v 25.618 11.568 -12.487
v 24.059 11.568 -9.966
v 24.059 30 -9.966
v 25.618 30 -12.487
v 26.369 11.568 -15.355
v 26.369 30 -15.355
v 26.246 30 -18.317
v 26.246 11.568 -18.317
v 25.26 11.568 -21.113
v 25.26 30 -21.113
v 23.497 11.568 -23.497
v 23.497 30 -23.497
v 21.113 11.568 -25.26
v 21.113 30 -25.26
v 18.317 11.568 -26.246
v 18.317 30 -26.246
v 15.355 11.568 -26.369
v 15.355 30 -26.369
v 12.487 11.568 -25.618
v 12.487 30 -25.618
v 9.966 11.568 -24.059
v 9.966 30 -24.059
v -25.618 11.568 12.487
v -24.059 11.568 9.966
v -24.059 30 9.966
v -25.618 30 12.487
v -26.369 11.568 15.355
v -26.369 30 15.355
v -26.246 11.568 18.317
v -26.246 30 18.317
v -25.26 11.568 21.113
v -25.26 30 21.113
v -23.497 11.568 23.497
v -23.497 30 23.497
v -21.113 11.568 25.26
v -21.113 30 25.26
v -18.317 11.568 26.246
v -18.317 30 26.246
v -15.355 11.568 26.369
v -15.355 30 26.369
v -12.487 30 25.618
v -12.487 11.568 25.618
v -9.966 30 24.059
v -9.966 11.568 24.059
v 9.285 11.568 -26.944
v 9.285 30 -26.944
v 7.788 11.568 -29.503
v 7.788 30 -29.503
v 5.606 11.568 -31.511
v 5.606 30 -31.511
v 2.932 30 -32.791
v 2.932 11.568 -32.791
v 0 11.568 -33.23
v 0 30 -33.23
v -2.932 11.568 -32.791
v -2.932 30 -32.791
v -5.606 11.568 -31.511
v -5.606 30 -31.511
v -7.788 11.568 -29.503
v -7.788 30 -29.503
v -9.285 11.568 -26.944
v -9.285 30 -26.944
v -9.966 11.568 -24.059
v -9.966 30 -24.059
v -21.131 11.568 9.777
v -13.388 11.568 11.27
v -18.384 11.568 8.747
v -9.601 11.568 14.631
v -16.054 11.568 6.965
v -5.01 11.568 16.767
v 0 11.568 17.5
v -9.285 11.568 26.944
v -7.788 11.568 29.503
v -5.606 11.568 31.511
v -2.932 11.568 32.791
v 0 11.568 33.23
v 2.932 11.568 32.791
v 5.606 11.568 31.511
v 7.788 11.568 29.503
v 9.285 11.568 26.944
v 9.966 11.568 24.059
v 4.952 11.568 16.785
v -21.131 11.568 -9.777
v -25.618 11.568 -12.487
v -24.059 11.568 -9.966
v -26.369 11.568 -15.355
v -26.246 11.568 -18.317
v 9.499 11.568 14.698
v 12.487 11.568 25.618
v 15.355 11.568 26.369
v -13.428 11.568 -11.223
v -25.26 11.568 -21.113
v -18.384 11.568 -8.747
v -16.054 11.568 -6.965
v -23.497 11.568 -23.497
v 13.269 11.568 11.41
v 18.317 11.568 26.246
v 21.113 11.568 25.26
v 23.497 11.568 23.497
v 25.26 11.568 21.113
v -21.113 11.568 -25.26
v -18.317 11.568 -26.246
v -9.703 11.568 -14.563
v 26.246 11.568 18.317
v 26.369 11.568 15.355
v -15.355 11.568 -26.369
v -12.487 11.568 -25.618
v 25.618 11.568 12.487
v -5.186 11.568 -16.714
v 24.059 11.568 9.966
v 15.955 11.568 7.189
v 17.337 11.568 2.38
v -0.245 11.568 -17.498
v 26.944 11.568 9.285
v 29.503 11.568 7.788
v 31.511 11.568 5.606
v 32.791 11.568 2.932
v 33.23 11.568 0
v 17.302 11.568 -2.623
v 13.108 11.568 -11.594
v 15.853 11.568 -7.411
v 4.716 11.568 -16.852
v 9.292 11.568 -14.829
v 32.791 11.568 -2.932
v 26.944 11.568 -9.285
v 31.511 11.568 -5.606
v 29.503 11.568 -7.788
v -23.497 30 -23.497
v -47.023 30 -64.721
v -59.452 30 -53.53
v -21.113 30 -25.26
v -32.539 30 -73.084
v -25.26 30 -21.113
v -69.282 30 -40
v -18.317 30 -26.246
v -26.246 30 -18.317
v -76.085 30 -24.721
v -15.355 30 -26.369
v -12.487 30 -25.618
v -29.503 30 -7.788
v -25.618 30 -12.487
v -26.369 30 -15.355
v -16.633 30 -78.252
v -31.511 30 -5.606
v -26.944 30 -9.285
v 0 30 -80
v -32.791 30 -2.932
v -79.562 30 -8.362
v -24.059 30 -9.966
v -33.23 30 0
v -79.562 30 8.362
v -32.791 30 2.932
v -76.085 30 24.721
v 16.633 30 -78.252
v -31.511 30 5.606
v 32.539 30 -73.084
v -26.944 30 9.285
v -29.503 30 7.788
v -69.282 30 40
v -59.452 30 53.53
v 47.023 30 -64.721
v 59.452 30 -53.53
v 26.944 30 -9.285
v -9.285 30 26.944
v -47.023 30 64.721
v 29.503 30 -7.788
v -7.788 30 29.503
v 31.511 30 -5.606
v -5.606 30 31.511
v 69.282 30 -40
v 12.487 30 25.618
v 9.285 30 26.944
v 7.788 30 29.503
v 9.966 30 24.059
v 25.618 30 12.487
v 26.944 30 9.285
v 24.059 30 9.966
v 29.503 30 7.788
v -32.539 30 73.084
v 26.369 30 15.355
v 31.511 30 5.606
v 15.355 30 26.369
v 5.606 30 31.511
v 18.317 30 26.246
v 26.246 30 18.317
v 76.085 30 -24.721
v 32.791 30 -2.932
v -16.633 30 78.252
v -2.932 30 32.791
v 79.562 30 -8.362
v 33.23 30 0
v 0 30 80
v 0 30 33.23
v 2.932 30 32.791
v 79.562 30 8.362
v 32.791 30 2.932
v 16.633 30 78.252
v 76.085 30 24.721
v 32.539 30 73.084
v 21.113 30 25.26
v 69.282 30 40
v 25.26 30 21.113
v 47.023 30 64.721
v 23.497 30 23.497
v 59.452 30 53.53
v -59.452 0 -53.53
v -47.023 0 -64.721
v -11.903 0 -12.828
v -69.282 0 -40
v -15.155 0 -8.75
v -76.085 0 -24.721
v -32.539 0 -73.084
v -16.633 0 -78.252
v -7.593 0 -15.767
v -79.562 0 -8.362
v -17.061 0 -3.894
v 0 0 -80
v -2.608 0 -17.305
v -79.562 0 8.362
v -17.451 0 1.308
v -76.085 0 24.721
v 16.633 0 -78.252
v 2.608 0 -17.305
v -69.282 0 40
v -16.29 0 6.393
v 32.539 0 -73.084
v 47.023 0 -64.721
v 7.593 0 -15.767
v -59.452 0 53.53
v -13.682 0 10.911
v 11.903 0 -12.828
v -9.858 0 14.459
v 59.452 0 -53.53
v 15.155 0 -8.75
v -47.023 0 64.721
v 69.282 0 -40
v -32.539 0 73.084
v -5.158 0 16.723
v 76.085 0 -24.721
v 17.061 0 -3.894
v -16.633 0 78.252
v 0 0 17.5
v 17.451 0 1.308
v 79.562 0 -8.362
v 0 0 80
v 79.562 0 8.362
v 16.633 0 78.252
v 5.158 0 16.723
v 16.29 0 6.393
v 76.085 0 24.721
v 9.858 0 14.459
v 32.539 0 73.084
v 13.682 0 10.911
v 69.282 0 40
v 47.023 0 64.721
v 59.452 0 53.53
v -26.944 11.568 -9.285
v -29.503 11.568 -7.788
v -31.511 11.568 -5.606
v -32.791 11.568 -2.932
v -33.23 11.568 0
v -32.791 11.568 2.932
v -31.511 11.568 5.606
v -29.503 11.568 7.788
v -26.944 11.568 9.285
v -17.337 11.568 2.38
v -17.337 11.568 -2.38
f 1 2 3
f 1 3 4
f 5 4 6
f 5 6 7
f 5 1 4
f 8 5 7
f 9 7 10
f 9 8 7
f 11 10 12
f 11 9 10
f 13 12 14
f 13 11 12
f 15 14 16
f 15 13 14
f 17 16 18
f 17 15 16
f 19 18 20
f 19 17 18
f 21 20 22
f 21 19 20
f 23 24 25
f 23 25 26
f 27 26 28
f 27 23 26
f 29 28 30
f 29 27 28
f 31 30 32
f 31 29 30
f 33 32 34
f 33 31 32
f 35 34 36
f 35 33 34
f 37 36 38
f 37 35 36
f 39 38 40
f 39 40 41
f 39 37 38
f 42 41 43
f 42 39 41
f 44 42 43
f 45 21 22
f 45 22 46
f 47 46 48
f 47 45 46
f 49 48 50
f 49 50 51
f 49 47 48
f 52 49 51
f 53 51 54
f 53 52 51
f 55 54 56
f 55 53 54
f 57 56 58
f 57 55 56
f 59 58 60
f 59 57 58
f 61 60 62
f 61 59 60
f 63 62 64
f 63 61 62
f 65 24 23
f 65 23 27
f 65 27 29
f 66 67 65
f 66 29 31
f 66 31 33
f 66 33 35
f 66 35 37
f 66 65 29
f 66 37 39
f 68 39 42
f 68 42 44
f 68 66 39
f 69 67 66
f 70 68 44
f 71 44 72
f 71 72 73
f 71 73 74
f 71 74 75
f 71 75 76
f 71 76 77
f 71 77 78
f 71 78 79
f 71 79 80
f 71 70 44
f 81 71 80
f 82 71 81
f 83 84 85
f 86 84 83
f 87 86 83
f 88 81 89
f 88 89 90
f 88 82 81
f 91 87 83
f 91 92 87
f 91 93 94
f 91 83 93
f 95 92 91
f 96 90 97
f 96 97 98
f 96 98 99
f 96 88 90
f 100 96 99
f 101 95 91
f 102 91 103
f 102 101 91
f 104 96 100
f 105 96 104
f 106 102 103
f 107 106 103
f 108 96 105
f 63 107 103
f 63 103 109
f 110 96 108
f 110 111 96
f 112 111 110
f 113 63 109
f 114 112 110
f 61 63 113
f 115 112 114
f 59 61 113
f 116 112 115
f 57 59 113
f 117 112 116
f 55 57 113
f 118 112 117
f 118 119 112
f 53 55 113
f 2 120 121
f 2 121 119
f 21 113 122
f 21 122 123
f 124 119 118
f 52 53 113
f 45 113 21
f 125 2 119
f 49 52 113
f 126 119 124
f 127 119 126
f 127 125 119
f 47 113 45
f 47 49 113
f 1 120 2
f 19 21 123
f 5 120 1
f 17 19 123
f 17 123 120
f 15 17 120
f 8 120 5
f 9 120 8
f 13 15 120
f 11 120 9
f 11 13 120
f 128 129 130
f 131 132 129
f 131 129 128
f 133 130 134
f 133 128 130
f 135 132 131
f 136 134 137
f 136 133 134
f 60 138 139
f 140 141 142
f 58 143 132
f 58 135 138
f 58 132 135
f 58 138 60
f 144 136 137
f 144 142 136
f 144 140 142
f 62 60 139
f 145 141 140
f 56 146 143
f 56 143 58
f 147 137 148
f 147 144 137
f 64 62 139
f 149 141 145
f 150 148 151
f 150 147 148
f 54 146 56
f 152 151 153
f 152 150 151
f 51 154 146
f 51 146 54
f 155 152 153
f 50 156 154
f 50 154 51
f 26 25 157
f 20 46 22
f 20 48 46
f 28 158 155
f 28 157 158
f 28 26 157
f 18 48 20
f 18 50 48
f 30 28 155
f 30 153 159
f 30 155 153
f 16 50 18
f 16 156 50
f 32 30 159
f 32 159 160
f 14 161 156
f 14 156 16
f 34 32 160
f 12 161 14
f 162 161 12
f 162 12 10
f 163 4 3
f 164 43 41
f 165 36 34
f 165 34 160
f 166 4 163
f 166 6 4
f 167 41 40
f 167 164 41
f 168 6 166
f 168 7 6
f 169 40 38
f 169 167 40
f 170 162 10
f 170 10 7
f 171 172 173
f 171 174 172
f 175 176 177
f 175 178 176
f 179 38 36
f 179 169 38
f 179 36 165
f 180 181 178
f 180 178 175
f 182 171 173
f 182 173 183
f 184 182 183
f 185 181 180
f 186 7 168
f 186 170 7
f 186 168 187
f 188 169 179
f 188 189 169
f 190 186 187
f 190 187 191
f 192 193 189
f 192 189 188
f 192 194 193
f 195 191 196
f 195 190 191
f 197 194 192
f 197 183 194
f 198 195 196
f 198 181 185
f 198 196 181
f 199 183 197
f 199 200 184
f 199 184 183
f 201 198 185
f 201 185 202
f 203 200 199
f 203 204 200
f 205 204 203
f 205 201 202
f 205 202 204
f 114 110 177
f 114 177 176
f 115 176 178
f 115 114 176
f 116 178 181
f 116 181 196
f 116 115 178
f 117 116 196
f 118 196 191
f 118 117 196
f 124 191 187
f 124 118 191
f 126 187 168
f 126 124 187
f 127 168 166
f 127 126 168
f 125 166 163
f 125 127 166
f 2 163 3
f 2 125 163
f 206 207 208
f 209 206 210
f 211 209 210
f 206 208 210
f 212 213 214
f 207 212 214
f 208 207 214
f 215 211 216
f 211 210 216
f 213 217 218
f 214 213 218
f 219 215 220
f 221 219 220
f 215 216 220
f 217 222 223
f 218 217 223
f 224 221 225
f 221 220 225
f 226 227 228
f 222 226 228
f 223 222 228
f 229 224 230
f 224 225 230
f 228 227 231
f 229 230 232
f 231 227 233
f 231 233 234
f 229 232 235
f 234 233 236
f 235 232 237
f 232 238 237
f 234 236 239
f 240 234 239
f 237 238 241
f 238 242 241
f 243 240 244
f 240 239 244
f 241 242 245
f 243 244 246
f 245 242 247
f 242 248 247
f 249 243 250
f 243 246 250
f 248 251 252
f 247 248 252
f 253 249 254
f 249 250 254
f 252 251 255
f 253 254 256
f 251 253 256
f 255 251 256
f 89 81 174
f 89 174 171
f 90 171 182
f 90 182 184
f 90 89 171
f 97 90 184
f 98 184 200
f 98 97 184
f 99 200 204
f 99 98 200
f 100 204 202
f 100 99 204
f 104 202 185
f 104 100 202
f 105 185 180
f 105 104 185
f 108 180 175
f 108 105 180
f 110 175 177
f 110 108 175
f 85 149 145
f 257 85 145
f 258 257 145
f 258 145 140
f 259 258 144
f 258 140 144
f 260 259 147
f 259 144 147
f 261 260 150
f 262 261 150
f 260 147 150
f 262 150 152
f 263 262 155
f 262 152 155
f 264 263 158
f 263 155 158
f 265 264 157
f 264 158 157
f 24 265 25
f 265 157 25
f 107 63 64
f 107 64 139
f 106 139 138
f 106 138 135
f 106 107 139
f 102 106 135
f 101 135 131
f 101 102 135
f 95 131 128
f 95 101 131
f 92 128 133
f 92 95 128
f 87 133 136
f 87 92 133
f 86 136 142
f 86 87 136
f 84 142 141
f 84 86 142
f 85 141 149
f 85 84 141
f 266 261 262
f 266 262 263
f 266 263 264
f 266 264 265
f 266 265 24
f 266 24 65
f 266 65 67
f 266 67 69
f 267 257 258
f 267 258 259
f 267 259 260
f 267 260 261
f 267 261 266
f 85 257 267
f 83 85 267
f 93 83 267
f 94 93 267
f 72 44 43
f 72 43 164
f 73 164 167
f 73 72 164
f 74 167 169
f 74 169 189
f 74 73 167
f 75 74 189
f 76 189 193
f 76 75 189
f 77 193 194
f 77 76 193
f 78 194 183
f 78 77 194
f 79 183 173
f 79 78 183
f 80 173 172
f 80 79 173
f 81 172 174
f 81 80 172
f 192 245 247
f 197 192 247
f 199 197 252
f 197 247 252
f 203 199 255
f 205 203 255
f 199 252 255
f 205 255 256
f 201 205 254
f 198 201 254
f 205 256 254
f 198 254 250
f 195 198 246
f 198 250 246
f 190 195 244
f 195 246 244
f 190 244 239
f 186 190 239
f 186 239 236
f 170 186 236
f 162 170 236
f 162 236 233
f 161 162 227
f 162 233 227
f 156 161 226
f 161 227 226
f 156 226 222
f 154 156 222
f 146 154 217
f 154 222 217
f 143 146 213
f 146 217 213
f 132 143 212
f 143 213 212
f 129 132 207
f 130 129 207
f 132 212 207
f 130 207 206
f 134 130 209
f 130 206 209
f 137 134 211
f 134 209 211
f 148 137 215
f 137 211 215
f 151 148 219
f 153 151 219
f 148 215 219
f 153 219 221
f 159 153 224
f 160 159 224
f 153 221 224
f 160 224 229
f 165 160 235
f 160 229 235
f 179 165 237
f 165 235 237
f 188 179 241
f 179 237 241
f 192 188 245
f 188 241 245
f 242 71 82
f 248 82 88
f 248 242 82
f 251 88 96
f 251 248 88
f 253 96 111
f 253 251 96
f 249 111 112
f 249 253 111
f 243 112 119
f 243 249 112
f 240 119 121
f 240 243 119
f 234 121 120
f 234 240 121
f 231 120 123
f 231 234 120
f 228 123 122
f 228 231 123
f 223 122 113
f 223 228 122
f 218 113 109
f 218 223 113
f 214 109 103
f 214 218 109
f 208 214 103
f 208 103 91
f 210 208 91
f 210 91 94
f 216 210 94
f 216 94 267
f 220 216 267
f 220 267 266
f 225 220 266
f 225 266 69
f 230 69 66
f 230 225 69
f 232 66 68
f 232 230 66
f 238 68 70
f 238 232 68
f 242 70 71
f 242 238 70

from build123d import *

# Parameters (mm, degrees)
SKETCH1_R           = 80
BOSS_EXTRUDE1_DEPTH = 30
SKETCH2_R           = 17.5
CUT_EXTRUDE1_DEPTH  = 118.046999107
SKETCH3_R           = 10
CUT_EXTRUDE2_DEPTH  = 18.432040154
CIRPATTERN1_COUNT   = 8


with BuildPart() as part:
    # Sketch1 → Boss-Extrude1 (new body)
    with BuildSketch(Plane(origin=(0, 0, 0), x_dir=(1, 0, 0), z_dir=(0, 1, 0))):
        Circle(SKETCH1_R)
    extrude(amount=BOSS_EXTRUDE1_DEPTH)

    # Sketch2 → Cut-Extrude1 (cut, through all)
    with BuildSketch(Plane(origin=(0, 0, 0), x_dir=(1, 0, 0), z_dir=(0, 1, 0))):
        Circle(SKETCH2_R)
    extrude(amount=CUT_EXTRUDE1_DEPTH, mode=Mode.SUBTRACT)

    # Sketch3 → Cut-Extrude2 (cut)
    with BuildSketch(Plane(origin=(0, 30, 0), x_dir=(1, 0, 0), z_dir=(0, 1, 0))):
        with Locations((-23.230150503, 0)):
            Circle(SKETCH3_R)
    cut_extrude2 = extrude(amount=-CUT_EXTRUDE2_DEPTH, mode=Mode.SUBTRACT)

    # CirPattern1: Cut-Extrude2 ×8 about axis
    cirpattern1_axis = Axis((0, 0, 0), (0, 1, 0))
    for i in range(1, CIRPATTERN1_COUNT):
        add(cut_extrude2.rotate(cirpattern1_axis, i * 360 / CIRPATTERN1_COUNT), mode=Mode.SUBTRACT)


solid = part.part
